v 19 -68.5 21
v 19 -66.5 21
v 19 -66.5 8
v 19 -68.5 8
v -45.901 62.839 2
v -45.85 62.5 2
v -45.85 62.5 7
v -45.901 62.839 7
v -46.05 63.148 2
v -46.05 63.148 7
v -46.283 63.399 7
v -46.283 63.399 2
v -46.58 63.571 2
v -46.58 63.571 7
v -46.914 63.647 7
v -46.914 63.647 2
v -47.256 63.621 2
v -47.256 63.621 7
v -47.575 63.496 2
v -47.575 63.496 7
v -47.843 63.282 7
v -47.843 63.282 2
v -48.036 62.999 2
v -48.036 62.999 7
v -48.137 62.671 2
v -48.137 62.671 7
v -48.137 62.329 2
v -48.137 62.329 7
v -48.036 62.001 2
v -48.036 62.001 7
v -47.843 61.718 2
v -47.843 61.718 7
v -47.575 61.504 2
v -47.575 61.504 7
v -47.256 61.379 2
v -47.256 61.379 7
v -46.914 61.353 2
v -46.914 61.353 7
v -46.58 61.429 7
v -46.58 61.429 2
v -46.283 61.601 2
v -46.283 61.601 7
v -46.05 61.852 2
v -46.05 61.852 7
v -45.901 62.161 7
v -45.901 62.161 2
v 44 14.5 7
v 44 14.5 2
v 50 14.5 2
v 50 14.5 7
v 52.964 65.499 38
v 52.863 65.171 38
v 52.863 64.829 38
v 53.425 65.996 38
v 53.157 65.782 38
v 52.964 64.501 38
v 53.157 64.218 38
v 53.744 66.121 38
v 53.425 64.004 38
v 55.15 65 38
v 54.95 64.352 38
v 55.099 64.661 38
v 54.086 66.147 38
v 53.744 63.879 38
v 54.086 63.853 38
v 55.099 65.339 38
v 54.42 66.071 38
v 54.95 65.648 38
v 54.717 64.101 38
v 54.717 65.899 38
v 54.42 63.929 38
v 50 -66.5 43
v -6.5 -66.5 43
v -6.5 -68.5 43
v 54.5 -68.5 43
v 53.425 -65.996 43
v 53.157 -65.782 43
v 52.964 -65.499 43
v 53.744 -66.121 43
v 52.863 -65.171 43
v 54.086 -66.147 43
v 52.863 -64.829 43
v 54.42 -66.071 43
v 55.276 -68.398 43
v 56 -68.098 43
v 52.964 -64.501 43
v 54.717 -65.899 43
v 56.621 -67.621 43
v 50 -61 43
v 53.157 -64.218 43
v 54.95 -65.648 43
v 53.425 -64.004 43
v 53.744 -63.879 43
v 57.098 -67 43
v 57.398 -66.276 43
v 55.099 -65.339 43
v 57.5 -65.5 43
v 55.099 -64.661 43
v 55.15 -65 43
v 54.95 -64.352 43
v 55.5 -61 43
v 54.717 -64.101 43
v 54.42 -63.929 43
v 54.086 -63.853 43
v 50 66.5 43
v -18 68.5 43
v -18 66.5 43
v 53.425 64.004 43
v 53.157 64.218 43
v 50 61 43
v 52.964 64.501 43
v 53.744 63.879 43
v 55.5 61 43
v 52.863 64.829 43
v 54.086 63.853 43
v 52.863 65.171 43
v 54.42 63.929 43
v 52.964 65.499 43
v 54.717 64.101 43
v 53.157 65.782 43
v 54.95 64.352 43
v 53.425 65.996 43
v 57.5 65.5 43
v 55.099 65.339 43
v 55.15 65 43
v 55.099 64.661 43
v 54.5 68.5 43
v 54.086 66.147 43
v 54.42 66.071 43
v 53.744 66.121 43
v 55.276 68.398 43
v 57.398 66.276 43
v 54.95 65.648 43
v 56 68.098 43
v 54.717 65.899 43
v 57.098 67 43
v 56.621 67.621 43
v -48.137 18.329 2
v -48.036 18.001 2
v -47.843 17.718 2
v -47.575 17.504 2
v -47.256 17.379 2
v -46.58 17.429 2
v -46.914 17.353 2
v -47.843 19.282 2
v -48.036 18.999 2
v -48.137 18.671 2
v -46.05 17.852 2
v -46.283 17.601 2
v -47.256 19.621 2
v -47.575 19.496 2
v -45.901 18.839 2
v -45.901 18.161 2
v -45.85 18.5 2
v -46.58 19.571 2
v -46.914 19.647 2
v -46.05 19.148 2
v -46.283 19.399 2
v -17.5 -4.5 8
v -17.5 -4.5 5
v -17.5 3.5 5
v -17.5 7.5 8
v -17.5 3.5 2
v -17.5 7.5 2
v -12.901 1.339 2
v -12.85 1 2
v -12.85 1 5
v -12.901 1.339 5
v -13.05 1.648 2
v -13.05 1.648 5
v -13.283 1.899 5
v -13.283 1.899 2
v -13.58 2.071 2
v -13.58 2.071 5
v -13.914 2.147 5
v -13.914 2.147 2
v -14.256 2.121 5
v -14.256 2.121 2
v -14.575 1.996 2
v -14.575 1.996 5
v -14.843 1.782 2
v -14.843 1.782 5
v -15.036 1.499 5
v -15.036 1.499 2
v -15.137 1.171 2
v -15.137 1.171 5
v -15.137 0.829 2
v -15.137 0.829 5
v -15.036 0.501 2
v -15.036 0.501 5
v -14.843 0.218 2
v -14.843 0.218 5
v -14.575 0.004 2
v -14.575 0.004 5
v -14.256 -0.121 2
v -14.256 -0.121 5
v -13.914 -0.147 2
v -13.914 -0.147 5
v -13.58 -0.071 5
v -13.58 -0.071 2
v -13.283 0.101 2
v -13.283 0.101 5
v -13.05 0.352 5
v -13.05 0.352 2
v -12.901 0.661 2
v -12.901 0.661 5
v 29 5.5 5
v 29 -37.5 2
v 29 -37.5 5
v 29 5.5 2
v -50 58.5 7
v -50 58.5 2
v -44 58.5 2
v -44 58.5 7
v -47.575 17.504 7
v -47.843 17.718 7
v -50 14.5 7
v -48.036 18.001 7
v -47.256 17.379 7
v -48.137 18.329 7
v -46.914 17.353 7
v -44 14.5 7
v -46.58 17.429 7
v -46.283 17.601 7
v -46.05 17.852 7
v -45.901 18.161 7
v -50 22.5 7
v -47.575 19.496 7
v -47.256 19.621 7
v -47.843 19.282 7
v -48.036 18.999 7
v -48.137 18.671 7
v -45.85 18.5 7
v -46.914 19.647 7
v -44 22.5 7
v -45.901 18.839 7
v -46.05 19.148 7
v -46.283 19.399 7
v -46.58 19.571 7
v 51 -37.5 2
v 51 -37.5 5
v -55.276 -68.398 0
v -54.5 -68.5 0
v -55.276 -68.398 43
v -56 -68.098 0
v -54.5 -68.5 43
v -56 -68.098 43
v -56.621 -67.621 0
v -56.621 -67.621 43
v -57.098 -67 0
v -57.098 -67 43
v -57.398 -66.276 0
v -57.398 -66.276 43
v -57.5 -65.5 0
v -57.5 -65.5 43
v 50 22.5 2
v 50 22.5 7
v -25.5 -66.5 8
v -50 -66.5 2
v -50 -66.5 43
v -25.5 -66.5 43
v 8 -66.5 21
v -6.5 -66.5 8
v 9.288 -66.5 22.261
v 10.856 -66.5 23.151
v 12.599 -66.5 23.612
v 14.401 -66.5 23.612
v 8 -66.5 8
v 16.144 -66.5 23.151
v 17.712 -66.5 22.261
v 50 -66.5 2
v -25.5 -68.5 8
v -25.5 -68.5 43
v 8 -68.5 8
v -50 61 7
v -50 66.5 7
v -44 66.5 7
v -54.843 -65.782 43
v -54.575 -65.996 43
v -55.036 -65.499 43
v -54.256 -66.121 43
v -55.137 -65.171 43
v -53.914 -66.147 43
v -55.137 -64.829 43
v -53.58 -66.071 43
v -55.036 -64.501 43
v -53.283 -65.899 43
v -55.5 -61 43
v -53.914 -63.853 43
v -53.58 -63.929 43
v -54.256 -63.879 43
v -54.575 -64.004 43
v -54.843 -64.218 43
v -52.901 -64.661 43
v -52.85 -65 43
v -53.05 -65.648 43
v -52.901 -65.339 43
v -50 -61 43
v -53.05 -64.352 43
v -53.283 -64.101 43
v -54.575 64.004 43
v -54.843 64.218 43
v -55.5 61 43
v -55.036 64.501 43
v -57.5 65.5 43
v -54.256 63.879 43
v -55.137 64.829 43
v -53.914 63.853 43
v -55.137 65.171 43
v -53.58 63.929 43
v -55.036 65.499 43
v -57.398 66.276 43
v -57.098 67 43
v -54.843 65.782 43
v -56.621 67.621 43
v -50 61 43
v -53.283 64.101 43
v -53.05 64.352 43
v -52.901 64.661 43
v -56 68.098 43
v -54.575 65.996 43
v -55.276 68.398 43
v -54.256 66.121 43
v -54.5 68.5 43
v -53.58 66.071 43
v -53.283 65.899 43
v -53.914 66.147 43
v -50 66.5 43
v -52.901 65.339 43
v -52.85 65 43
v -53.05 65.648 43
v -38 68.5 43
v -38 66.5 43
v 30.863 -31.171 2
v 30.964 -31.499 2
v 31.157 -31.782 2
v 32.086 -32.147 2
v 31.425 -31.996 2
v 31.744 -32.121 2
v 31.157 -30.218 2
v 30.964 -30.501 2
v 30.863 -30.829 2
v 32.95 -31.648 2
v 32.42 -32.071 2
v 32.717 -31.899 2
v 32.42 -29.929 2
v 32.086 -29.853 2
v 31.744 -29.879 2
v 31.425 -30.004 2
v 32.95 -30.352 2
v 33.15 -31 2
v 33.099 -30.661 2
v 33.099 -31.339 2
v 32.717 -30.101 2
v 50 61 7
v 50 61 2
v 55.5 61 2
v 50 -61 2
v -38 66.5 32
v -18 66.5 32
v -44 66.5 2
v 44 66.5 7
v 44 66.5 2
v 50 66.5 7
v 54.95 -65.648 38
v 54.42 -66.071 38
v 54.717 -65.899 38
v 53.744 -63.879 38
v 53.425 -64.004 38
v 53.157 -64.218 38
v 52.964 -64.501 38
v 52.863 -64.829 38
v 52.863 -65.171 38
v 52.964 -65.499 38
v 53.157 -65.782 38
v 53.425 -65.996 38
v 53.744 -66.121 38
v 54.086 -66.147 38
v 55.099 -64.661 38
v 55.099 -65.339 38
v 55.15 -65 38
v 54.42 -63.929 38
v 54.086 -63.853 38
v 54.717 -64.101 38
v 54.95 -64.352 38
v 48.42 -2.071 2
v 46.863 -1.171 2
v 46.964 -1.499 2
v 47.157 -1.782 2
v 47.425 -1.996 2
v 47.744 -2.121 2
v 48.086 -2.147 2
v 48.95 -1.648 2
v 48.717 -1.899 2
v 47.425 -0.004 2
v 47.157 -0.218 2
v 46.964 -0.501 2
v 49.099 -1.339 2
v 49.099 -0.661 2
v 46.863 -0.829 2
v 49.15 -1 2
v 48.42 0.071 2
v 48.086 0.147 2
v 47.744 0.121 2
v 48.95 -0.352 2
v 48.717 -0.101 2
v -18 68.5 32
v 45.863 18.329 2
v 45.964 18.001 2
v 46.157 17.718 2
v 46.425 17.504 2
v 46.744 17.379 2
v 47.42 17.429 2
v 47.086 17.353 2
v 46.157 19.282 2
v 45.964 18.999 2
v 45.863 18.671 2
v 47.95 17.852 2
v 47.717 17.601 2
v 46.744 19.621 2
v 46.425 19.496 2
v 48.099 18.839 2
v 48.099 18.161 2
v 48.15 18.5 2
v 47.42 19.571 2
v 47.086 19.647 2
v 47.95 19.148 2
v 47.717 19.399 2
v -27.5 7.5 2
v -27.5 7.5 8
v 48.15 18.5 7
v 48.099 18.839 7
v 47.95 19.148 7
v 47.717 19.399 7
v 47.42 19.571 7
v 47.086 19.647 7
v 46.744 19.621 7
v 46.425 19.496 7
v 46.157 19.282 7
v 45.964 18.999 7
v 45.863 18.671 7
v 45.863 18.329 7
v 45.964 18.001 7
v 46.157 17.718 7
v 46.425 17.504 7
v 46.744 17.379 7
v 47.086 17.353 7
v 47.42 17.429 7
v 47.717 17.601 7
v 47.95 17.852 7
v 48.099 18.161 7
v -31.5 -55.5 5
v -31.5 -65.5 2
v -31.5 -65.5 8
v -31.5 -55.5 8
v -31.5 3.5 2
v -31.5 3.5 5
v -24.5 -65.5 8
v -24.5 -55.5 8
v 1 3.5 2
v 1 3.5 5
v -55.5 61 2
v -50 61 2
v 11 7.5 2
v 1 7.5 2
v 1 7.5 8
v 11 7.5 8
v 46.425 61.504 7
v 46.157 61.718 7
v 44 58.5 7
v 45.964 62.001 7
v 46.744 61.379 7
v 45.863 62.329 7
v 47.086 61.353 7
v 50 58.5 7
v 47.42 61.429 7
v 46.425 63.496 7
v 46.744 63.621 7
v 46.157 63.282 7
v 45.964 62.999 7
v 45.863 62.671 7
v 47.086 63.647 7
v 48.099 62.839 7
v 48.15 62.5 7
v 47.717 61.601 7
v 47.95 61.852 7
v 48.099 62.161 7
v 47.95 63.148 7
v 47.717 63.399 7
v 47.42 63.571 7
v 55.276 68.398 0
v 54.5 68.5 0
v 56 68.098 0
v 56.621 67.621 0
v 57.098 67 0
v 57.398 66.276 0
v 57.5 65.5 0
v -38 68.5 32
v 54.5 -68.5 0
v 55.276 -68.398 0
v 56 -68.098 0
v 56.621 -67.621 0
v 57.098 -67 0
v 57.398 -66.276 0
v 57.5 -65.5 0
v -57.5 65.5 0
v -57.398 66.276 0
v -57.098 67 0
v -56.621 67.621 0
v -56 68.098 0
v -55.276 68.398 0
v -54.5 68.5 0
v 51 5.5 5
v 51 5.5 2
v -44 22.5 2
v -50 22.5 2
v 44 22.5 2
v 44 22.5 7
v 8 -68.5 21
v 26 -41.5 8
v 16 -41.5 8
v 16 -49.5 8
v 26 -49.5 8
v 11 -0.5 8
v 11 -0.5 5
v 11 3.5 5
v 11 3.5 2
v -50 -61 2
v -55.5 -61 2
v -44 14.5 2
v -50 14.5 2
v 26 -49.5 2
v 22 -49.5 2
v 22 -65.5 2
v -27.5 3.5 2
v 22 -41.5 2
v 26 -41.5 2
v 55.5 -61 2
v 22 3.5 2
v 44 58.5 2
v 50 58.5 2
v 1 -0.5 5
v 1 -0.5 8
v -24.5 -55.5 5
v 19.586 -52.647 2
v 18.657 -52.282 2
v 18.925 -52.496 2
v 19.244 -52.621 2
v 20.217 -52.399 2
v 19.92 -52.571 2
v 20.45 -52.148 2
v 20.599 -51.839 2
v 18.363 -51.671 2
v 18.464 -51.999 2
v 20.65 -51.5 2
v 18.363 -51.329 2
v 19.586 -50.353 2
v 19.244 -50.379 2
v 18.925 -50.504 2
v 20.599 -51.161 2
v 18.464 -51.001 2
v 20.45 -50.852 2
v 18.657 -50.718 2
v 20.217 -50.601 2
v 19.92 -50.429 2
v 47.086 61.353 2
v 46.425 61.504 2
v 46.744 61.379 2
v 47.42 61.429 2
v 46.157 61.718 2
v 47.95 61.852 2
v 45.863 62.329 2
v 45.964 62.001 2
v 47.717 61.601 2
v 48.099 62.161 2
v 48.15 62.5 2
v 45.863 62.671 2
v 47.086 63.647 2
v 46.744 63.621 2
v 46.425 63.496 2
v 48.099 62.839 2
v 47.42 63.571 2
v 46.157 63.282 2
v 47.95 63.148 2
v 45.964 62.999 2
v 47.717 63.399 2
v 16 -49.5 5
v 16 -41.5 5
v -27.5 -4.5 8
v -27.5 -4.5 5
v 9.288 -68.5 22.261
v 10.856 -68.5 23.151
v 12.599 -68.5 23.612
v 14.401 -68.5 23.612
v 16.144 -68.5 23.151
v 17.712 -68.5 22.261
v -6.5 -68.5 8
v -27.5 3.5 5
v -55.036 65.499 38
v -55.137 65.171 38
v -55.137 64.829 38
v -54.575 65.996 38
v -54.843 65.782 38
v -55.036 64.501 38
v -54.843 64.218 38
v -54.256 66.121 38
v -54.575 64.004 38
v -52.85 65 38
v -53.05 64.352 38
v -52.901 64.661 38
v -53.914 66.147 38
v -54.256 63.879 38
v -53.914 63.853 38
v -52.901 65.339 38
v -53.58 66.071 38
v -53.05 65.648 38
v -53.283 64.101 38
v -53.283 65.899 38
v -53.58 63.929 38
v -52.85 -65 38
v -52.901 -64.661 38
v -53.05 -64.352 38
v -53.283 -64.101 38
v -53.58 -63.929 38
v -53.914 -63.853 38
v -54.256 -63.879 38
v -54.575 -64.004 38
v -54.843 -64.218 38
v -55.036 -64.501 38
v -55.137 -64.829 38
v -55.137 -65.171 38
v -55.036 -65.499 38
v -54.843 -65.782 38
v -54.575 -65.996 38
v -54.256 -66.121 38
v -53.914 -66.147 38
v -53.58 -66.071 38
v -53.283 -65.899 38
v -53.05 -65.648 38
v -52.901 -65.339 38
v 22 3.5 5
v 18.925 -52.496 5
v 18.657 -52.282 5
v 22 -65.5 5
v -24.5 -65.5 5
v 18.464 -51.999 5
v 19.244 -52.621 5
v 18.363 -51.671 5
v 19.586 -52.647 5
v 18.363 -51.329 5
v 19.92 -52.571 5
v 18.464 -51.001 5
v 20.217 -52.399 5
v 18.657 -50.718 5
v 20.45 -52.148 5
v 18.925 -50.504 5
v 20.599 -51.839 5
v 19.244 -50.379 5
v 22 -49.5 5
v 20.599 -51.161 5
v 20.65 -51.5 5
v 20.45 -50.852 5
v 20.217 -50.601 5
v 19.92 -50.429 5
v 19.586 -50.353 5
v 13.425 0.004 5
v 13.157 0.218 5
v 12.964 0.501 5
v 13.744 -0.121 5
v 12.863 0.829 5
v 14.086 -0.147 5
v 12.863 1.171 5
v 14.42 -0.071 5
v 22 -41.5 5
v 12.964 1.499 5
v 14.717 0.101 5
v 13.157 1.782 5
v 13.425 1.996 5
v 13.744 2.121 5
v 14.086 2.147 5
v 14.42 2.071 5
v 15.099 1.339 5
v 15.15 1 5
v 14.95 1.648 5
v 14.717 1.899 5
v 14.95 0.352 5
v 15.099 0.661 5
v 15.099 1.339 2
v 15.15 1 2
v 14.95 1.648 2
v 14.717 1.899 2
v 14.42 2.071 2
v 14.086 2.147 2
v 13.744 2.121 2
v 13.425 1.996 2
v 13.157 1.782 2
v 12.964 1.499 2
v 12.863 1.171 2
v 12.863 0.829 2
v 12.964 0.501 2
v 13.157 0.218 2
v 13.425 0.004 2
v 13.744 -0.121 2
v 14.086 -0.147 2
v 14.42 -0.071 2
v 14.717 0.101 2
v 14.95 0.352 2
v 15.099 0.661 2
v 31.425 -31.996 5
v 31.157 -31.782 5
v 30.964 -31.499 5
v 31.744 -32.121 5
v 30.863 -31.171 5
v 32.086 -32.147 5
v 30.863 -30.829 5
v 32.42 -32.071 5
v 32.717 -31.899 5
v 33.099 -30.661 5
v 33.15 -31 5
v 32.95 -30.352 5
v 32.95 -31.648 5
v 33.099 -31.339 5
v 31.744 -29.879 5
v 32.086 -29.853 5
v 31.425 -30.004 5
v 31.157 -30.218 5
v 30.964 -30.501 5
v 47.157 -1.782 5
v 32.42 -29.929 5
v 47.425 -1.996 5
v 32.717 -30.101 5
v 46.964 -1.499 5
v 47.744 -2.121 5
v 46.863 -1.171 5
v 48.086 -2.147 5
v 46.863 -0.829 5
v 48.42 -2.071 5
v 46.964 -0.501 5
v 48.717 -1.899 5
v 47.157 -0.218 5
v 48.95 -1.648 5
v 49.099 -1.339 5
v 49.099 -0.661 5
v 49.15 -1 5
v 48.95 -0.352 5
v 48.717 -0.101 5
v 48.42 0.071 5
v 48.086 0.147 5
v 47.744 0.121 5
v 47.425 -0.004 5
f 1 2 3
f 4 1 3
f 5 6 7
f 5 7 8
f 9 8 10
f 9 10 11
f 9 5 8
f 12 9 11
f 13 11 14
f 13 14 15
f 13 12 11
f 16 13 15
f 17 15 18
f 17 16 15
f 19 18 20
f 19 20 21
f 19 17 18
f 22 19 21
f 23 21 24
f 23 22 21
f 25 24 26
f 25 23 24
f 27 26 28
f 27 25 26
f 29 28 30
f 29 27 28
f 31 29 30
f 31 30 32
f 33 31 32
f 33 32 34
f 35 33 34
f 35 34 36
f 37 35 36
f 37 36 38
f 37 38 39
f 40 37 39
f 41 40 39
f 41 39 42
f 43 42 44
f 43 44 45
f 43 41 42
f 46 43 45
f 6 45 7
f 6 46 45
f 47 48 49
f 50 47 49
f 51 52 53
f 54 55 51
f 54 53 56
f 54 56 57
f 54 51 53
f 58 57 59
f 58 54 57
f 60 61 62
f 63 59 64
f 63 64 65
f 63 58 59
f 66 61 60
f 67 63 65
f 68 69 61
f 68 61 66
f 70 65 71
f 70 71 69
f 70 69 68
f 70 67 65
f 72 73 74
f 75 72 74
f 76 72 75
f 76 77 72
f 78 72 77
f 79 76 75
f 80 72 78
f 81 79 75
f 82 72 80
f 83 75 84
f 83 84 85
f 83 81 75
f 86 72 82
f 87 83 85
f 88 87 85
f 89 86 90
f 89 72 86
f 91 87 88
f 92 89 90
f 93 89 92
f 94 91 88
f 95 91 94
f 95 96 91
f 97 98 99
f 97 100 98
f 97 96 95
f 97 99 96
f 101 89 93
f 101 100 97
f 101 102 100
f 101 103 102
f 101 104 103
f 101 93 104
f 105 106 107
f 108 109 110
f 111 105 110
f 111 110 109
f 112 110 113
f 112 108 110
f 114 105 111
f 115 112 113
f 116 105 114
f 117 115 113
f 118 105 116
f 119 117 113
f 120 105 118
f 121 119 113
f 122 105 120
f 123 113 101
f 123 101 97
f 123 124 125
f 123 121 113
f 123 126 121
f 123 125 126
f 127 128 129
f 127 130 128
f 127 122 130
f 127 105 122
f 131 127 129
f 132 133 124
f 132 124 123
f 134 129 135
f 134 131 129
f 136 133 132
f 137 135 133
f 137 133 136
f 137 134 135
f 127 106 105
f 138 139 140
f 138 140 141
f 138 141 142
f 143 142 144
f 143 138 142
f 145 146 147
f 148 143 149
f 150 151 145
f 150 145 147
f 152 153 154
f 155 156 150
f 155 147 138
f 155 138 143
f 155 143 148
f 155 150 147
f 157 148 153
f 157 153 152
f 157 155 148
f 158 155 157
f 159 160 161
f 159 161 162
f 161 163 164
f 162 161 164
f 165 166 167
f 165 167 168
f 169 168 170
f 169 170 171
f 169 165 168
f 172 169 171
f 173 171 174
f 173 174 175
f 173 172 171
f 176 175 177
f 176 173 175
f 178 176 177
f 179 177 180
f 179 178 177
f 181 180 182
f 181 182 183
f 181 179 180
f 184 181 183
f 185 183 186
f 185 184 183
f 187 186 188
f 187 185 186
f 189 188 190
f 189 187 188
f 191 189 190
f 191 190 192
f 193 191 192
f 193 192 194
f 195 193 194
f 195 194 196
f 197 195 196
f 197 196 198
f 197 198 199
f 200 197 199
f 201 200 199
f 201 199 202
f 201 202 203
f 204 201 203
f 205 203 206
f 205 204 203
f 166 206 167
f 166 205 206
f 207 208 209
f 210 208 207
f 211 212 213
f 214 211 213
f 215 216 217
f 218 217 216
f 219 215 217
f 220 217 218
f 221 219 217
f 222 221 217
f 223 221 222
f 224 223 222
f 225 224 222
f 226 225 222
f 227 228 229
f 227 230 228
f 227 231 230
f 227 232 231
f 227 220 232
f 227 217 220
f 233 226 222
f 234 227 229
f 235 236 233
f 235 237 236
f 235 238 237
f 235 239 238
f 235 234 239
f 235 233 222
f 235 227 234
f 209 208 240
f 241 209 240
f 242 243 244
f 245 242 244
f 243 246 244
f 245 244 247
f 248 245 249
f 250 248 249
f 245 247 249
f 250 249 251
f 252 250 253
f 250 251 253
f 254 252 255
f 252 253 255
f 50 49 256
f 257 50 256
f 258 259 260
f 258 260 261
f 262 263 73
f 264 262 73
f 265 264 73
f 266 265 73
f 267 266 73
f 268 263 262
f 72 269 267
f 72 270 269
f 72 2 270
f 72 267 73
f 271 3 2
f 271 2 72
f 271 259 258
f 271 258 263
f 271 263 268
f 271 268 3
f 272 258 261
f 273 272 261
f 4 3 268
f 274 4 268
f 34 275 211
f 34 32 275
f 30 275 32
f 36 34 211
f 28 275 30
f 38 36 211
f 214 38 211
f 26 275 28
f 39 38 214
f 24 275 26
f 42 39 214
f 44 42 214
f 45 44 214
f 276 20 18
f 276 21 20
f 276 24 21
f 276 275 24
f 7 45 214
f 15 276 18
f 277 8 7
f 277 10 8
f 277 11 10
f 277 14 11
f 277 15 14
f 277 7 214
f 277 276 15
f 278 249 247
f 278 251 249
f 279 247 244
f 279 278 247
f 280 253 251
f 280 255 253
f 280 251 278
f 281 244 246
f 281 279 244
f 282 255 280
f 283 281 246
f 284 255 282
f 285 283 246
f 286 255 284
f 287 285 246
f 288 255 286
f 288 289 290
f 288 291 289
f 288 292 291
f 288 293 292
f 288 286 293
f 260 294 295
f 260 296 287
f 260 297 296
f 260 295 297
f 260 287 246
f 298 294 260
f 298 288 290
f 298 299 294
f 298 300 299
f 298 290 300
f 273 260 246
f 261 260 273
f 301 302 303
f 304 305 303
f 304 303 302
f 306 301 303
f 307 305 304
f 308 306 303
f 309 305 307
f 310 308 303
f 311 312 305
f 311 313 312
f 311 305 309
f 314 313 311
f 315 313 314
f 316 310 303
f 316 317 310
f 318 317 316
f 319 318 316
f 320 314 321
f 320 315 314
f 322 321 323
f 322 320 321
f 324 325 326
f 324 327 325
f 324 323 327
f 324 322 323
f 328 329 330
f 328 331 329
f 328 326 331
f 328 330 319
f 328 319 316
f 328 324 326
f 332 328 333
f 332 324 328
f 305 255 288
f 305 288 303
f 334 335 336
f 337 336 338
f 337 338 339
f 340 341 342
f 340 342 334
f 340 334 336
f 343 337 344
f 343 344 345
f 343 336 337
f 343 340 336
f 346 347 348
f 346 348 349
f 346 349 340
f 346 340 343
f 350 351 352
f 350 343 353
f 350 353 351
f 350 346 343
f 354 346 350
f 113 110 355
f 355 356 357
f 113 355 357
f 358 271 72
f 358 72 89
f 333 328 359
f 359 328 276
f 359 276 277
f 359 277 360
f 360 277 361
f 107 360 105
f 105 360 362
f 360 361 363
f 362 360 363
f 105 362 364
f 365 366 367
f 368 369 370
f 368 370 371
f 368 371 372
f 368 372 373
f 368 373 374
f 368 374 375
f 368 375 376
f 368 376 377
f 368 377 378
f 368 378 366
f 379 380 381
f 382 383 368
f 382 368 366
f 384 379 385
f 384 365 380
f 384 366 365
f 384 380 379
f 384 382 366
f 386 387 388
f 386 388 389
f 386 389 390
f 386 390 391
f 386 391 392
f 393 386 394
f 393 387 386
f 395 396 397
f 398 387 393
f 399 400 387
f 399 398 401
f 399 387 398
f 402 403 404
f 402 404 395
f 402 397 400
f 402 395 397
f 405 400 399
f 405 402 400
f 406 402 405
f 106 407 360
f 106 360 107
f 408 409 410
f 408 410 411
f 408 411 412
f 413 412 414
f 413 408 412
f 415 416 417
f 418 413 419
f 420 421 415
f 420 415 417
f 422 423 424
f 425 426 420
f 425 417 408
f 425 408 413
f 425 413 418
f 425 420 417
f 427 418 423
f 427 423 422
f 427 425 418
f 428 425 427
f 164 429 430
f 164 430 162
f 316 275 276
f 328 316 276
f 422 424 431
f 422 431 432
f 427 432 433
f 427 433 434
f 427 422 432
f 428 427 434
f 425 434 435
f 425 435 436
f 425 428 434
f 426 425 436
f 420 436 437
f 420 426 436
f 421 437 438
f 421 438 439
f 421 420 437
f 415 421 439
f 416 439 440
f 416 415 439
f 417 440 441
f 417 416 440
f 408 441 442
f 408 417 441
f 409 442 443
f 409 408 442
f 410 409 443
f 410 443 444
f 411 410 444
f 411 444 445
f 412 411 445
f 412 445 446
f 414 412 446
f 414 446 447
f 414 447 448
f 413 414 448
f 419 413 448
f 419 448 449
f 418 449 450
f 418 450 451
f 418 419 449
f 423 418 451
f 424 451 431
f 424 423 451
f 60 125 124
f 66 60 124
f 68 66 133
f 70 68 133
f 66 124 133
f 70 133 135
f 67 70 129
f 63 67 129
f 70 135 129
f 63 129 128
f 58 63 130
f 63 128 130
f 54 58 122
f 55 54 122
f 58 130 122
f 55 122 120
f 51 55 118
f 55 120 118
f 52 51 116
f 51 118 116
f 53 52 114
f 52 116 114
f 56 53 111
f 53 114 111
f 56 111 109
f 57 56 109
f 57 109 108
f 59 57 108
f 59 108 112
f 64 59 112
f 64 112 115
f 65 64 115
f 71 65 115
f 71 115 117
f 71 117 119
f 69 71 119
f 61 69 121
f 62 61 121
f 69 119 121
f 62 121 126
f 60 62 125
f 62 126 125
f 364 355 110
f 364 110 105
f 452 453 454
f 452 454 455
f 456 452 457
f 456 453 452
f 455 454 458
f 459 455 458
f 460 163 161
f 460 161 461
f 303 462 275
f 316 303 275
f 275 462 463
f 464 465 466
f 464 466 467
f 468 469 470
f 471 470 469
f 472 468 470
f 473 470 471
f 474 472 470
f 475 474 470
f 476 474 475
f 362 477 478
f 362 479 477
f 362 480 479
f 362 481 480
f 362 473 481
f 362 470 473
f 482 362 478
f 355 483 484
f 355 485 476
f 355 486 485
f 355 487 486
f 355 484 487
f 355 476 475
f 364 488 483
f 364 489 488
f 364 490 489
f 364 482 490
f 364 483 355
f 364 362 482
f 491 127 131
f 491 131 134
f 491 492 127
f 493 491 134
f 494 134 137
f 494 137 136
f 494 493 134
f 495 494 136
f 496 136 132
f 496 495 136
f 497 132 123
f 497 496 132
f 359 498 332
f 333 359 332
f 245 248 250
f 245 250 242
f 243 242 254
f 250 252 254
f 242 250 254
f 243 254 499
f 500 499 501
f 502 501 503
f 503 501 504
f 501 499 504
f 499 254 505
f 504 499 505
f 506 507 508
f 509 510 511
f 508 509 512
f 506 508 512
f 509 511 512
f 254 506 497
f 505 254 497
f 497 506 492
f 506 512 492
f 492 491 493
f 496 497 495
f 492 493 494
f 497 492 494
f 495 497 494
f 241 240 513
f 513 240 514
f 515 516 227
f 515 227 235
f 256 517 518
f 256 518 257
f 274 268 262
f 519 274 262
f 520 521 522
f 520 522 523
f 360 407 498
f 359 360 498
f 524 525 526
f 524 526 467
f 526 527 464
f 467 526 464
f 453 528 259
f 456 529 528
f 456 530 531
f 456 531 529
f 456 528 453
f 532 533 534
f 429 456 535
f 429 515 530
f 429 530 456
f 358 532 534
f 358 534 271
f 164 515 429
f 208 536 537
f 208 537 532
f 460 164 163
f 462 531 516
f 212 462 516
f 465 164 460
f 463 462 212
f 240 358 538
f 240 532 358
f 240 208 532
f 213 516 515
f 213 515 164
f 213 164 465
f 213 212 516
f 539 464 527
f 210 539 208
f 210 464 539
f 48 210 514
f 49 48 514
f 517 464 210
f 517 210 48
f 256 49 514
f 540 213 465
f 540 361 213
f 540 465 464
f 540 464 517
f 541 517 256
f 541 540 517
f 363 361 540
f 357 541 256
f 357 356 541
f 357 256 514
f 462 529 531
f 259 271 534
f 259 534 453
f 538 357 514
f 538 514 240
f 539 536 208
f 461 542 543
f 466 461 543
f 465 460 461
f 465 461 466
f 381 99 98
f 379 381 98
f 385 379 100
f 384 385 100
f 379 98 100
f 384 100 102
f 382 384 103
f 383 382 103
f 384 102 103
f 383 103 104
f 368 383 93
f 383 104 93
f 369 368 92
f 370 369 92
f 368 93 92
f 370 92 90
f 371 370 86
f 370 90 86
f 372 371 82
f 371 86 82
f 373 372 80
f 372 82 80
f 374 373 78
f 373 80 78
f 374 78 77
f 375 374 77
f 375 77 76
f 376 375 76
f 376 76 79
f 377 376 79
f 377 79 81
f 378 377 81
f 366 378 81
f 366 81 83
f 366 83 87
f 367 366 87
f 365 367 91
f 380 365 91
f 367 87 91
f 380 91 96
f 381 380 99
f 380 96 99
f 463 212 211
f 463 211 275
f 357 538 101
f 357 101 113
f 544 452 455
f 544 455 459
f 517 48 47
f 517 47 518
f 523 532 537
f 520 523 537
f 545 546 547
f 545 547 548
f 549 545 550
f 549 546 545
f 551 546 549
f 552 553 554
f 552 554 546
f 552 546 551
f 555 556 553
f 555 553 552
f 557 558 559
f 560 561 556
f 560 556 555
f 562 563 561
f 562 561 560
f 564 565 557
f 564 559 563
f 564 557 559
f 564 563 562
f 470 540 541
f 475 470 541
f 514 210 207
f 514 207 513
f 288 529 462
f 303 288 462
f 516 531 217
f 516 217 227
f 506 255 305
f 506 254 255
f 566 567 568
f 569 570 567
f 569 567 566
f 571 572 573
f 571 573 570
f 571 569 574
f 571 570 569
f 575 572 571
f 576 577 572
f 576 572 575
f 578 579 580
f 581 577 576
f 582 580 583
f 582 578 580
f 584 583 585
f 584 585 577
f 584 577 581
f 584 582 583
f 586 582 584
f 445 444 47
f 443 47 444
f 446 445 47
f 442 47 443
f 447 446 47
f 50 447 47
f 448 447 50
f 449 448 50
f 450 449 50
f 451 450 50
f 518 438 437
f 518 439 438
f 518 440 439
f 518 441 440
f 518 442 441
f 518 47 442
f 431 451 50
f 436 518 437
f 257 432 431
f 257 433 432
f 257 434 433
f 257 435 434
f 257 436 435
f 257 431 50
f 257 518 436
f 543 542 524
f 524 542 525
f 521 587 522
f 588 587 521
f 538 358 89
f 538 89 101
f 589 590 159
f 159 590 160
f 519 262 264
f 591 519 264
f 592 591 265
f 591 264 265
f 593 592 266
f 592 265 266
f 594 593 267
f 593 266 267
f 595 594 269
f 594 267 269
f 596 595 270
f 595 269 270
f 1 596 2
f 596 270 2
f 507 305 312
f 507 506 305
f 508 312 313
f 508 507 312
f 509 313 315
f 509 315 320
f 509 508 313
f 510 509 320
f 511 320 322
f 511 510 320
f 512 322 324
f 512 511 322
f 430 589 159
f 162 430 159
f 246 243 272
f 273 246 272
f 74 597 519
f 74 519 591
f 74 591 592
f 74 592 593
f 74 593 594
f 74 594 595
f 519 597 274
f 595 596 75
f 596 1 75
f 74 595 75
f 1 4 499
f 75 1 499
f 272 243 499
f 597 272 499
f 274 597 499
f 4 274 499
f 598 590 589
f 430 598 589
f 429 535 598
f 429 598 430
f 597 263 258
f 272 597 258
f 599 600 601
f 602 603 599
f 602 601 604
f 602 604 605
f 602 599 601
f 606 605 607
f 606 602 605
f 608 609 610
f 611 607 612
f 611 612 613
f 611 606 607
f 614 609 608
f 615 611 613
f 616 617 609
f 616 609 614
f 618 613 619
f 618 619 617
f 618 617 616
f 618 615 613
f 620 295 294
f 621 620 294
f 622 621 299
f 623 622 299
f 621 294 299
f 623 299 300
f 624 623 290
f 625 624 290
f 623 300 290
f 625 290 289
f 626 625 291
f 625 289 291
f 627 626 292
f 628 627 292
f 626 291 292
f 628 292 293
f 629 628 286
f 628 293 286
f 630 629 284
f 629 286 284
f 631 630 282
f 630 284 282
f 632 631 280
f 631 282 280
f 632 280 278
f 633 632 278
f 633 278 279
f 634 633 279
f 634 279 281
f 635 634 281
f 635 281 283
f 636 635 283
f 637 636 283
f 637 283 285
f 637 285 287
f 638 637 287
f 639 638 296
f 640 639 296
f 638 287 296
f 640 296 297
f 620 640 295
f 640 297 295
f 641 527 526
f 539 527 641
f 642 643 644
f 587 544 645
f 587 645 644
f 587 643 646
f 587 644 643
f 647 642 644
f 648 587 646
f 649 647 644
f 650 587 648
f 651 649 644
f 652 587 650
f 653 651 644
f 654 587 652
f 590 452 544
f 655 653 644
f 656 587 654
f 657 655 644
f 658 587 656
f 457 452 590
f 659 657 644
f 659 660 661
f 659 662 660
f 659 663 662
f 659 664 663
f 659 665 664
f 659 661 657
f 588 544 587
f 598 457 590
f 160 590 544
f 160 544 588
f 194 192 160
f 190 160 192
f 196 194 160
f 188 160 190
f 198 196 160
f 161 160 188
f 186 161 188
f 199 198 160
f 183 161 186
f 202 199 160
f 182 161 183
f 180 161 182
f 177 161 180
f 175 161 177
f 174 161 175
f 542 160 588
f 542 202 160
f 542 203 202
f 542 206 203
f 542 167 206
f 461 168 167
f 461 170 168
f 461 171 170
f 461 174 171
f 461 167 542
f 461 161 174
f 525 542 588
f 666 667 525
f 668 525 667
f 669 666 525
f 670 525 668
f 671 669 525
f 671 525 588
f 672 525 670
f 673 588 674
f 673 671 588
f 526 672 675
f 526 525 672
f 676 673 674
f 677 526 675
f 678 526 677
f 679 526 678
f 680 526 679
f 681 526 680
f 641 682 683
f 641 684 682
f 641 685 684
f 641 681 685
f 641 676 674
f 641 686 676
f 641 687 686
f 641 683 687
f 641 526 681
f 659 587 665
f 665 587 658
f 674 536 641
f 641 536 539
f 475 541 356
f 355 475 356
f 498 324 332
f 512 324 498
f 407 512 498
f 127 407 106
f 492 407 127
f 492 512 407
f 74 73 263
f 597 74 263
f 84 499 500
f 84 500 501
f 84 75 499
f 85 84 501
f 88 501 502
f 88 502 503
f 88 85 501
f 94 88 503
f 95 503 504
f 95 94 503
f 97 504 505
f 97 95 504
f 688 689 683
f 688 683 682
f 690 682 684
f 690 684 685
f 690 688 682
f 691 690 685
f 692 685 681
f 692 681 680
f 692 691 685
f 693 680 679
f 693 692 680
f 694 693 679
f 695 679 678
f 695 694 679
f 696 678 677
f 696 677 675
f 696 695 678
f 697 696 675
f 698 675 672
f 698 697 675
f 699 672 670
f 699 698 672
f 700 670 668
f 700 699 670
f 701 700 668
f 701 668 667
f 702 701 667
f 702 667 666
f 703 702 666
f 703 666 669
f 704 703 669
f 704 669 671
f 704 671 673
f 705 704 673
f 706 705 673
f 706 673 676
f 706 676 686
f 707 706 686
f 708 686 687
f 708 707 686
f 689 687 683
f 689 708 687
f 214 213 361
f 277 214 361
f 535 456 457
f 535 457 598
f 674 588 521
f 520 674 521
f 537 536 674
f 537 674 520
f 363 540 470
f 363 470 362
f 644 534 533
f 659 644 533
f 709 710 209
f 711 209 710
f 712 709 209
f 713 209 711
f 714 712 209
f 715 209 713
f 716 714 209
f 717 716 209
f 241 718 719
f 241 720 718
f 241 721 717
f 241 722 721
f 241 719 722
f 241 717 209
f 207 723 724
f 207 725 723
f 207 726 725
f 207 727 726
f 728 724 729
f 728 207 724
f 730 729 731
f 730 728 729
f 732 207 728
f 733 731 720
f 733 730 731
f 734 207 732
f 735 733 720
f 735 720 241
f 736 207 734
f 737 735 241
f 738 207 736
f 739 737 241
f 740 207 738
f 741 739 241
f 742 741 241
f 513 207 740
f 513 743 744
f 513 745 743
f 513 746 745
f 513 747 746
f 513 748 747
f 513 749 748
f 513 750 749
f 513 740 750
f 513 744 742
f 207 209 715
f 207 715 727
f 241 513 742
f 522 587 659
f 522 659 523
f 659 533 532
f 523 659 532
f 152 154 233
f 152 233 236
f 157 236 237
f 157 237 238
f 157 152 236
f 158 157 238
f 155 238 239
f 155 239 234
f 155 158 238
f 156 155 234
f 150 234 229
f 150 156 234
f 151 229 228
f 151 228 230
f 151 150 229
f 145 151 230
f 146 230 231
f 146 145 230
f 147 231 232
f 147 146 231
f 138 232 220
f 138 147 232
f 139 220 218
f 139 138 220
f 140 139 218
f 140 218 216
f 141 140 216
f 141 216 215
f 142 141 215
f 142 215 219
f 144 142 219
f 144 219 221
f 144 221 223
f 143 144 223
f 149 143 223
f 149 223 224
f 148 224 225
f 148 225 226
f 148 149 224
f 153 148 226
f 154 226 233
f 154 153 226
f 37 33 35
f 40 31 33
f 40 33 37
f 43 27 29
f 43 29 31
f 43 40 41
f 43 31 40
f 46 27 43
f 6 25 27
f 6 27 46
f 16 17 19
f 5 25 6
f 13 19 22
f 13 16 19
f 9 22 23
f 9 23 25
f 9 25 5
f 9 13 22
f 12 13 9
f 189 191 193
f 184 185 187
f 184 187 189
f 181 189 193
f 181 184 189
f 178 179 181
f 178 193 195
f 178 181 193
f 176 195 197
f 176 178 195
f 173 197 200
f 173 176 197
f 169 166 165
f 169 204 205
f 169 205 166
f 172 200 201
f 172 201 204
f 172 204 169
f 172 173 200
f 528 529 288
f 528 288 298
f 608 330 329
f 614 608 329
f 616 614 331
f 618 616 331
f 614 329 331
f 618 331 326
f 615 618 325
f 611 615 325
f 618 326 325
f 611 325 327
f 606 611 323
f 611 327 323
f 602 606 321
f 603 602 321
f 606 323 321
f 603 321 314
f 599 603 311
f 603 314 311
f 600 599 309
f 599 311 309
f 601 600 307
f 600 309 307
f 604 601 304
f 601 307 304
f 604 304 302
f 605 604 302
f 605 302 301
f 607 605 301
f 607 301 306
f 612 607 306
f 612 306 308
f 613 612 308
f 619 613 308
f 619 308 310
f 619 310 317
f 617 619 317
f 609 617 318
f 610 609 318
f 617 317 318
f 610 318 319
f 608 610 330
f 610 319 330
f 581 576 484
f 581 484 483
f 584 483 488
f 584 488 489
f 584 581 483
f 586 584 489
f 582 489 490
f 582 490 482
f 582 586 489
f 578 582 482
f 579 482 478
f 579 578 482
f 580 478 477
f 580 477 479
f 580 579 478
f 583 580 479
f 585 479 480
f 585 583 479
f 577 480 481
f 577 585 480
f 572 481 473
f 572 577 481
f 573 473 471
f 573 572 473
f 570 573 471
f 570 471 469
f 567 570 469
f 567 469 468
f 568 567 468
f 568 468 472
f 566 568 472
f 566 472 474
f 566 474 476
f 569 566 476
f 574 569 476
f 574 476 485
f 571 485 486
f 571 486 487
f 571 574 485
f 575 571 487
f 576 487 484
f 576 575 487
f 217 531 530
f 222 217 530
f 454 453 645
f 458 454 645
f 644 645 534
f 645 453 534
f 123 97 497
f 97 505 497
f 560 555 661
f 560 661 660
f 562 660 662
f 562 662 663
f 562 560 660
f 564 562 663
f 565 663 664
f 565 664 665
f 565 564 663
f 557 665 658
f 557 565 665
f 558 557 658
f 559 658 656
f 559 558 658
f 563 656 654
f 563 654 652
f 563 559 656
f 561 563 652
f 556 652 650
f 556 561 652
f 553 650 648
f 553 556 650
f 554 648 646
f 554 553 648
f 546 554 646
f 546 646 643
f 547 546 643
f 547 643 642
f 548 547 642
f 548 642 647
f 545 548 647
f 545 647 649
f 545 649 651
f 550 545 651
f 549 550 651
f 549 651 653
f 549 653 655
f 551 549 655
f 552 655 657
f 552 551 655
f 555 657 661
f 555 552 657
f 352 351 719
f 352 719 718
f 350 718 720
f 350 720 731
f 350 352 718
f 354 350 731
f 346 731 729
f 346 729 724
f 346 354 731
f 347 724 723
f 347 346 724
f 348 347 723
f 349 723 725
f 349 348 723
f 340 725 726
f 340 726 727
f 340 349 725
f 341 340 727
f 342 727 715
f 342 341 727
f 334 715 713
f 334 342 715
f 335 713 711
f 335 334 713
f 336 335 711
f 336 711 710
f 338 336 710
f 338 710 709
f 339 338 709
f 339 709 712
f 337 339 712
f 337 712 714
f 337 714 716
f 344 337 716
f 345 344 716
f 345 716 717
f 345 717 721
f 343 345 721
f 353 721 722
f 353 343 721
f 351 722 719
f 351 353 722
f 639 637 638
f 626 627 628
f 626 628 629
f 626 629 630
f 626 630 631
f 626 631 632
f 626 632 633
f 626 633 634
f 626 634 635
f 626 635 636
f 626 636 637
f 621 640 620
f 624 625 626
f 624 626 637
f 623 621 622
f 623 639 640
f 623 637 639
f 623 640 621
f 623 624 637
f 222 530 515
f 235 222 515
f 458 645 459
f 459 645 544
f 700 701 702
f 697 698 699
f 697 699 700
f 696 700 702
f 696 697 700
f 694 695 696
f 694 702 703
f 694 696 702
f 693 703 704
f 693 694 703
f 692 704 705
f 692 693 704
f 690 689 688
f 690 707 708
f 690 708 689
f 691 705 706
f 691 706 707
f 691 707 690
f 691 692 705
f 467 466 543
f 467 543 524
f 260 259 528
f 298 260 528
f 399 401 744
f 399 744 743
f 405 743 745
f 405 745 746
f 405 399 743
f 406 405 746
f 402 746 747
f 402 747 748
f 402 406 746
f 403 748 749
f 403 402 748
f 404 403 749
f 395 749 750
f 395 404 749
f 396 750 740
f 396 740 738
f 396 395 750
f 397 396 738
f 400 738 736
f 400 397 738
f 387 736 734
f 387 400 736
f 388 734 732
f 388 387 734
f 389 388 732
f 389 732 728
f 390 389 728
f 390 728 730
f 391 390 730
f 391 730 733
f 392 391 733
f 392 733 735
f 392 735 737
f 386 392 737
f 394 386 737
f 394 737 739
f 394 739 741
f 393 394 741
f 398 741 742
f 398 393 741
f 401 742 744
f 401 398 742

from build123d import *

# Parameters (mm, degrees)
F0_W      = 115
F0_H      = 137
F1_DEPTH  = 2
F2_W      = 115
F2_H      = 137
F2_W_2    = 111
F2_H_2    = 133
F3_DEPTH  = 41
F4_W      = 6
F4_H      = 8
F4_R      = 1.15
F5_DEPTH  = 5
F6_W      = 22
F6_H      = 43
F6_R      = 1.15
F7_DEPTH  = 3
F8_W      = 53.5
F8_H      = 69
F8_R      = 1.15
F9_DEPTH  = 3
F10_W     = 10
F10_H     = 8
F10_W_2   = 7
F10_H_2   = 10
F10_H_3   = 12
F11_DEPTH = 6
F12_W     = 19
F12_H     = 5.221757
F12_H_2   = 32
F13_DEPTH = 2
F14_W     = 20
F14_H     = 11
F15_DEPTH = 2
F16_W     = 5.5
F16_H     = 5.5
F17_DEPTH = 41
F18_R     = 1.15
F19_DEPTH = 5
F20_R     = 3


with BuildPart() as f1:
    # F0 (on Top) → F1 (new body)
    with BuildSketch(Plane.XY):
        Rectangle(F0_W, F0_H)
    extrude(amount=F1_DEPTH)

    # F2 (on face) → F3 (join)
    with BuildSketch(Plane.XY.offset(2)):
        Rectangle(F2_W, F2_H)
        Rectangle(F2_W_2, F2_H_2, mode=Mode.SUBTRACT)
    extrude(amount=F3_DEPTH)

    # F4 (on face) → F5 (join)
    with BuildSketch(Plane.XY.offset(2)):
        with Locations((-47, 62.5)):
            Rectangle(F4_W, F4_H)
        with Locations((-47, 62.5)):
            Circle(F4_R, mode=Mode.SUBTRACT)
        with Locations((47, 62.5)):
            Rectangle(F4_W, F4_H)
        with Locations((47, 62.5)):
            Circle(F4_R, mode=Mode.SUBTRACT)
        with Locations((-47, 18.5)):
            Rectangle(F4_W, F4_H)
        with Locations((-47, 18.5)):
            Circle(F4_R, mode=Mode.SUBTRACT)
        with Locations((47, 18.5)):
            Rectangle(F4_W, F4_H)
        with Locations((47, 18.5)):
            Circle(F4_R, mode=Mode.SUBTRACT)
    extrude(amount=F5_DEPTH)

    # F6 (on face) → F7 (join)
    with BuildSketch(Plane.XY.offset(2)):
        with Locations((40, -16)):
            Rectangle(F6_W, F6_H)
        with Locations((32, -31)):
            Circle(F6_R, mode=Mode.SUBTRACT)
        with Locations((48, -1)):
            Circle(F6_R, mode=Mode.SUBTRACT)
    extrude(amount=F7_DEPTH)

    # F8 (on face) → F9 (join)
    with BuildSketch(Plane.XY.offset(2)):
        with Locations((-4.75, -31)):
            Rectangle(F8_W, F8_H)
        with Locations((19.5, -51.5)):
            Circle(F8_R, mode=Mode.SUBTRACT)
        with Locations((-14, 1)):
            Circle(F8_R, mode=Mode.SUBTRACT)
        with Locations((14, 1)):
            Circle(F8_R, mode=Mode.SUBTRACT)
    extrude(amount=F9_DEPTH)

    # F10 (on face) → F11 (join)
    with BuildSketch(Plane.XY.offset(2)):
        with Locations((6, 3.5)):
            Rectangle(F10_W, F10_H)
        with Locations((21, -45.5)):
            Rectangle(F10_W, F10_H)
        with Locations((-28, -60.5)):
            Rectangle(F10_W_2, F10_H_2)
        with Locations((-22.5, 1.5)):
            Rectangle(F10_W, F10_H_3)
    extrude(amount=F11_DEPTH)

    # F12 (on face) → F13 (cut)
    with BuildSketch(Plane(origin=(0, -66.5, 0), x_dir=(-1, 0, 0), z_dir=(0, 1, 0))):
        with Locations((16, 42.610878)):
            Rectangle(F12_W, F12_H)
        with Locations((16, 24)):
            Rectangle(F12_W, F12_H_2)
        with BuildLine():
            Line((-19, 8), (-8, 8))
            Line((-8, 8), (-8, 21))
            ThreePointArc((-8, 21), (-13.5, 23.669873), (-19, 21))
            Line((-19, 21), (-19, 8))
        make_face()
    extrude(amount=-F13_DEPTH, mode=Mode.SUBTRACT)

    # F14 (on face) → F15 (cut)
    with BuildSketch(Plane(origin=(0, 68.5, 0), x_dir=(-1, 0, 0), z_dir=(0, 1, 0))):
        with Locations((28, 37.5)):
            Rectangle(F14_W, F14_H)
    extrude(amount=-F15_DEPTH, mode=Mode.SUBTRACT)

    # F16 (on face) → F17 (join)
    with BuildSketch(Plane.XY.offset(2)):
        with Locations((-52.75, -63.75)):
            Rectangle(F16_W, F16_H)
        with Locations((-52.75, 63.75)):
            Rectangle(F16_W, F16_H)
        with Locations((52.75, 63.75)):
            Rectangle(F16_W, F16_H)
        with Locations((52.75, -63.75)):
            Rectangle(F16_W, F16_H)
    extrude(amount=F17_DEPTH)

    # F18 (on face) → F19 (cut)
    with BuildSketch(Plane.XY.offset(43)):
        with Locations((-54, -65)):
            Circle(F18_R)
        with Locations((-54, 65)):
            Circle(F18_R)
        with Locations((54, 65)):
            Circle(F18_R)
        with Locations((54, -65)):
            Circle(F18_R)
    extrude(amount=-F19_DEPTH, mode=Mode.SUBTRACT)

    # F20
    f20_edges = [f1.edges().sort_by_distance(p)[0] for p in [
        (-57.5, -68.5, 21.5),
        (57.5, -68.5, 21.5),
        (57.5, 68.5, 21.5),
        (-57.5, 68.5, 21.5),
    ]]
    fillet(f20_edges, radius=F20_R)


solid = f1.part
